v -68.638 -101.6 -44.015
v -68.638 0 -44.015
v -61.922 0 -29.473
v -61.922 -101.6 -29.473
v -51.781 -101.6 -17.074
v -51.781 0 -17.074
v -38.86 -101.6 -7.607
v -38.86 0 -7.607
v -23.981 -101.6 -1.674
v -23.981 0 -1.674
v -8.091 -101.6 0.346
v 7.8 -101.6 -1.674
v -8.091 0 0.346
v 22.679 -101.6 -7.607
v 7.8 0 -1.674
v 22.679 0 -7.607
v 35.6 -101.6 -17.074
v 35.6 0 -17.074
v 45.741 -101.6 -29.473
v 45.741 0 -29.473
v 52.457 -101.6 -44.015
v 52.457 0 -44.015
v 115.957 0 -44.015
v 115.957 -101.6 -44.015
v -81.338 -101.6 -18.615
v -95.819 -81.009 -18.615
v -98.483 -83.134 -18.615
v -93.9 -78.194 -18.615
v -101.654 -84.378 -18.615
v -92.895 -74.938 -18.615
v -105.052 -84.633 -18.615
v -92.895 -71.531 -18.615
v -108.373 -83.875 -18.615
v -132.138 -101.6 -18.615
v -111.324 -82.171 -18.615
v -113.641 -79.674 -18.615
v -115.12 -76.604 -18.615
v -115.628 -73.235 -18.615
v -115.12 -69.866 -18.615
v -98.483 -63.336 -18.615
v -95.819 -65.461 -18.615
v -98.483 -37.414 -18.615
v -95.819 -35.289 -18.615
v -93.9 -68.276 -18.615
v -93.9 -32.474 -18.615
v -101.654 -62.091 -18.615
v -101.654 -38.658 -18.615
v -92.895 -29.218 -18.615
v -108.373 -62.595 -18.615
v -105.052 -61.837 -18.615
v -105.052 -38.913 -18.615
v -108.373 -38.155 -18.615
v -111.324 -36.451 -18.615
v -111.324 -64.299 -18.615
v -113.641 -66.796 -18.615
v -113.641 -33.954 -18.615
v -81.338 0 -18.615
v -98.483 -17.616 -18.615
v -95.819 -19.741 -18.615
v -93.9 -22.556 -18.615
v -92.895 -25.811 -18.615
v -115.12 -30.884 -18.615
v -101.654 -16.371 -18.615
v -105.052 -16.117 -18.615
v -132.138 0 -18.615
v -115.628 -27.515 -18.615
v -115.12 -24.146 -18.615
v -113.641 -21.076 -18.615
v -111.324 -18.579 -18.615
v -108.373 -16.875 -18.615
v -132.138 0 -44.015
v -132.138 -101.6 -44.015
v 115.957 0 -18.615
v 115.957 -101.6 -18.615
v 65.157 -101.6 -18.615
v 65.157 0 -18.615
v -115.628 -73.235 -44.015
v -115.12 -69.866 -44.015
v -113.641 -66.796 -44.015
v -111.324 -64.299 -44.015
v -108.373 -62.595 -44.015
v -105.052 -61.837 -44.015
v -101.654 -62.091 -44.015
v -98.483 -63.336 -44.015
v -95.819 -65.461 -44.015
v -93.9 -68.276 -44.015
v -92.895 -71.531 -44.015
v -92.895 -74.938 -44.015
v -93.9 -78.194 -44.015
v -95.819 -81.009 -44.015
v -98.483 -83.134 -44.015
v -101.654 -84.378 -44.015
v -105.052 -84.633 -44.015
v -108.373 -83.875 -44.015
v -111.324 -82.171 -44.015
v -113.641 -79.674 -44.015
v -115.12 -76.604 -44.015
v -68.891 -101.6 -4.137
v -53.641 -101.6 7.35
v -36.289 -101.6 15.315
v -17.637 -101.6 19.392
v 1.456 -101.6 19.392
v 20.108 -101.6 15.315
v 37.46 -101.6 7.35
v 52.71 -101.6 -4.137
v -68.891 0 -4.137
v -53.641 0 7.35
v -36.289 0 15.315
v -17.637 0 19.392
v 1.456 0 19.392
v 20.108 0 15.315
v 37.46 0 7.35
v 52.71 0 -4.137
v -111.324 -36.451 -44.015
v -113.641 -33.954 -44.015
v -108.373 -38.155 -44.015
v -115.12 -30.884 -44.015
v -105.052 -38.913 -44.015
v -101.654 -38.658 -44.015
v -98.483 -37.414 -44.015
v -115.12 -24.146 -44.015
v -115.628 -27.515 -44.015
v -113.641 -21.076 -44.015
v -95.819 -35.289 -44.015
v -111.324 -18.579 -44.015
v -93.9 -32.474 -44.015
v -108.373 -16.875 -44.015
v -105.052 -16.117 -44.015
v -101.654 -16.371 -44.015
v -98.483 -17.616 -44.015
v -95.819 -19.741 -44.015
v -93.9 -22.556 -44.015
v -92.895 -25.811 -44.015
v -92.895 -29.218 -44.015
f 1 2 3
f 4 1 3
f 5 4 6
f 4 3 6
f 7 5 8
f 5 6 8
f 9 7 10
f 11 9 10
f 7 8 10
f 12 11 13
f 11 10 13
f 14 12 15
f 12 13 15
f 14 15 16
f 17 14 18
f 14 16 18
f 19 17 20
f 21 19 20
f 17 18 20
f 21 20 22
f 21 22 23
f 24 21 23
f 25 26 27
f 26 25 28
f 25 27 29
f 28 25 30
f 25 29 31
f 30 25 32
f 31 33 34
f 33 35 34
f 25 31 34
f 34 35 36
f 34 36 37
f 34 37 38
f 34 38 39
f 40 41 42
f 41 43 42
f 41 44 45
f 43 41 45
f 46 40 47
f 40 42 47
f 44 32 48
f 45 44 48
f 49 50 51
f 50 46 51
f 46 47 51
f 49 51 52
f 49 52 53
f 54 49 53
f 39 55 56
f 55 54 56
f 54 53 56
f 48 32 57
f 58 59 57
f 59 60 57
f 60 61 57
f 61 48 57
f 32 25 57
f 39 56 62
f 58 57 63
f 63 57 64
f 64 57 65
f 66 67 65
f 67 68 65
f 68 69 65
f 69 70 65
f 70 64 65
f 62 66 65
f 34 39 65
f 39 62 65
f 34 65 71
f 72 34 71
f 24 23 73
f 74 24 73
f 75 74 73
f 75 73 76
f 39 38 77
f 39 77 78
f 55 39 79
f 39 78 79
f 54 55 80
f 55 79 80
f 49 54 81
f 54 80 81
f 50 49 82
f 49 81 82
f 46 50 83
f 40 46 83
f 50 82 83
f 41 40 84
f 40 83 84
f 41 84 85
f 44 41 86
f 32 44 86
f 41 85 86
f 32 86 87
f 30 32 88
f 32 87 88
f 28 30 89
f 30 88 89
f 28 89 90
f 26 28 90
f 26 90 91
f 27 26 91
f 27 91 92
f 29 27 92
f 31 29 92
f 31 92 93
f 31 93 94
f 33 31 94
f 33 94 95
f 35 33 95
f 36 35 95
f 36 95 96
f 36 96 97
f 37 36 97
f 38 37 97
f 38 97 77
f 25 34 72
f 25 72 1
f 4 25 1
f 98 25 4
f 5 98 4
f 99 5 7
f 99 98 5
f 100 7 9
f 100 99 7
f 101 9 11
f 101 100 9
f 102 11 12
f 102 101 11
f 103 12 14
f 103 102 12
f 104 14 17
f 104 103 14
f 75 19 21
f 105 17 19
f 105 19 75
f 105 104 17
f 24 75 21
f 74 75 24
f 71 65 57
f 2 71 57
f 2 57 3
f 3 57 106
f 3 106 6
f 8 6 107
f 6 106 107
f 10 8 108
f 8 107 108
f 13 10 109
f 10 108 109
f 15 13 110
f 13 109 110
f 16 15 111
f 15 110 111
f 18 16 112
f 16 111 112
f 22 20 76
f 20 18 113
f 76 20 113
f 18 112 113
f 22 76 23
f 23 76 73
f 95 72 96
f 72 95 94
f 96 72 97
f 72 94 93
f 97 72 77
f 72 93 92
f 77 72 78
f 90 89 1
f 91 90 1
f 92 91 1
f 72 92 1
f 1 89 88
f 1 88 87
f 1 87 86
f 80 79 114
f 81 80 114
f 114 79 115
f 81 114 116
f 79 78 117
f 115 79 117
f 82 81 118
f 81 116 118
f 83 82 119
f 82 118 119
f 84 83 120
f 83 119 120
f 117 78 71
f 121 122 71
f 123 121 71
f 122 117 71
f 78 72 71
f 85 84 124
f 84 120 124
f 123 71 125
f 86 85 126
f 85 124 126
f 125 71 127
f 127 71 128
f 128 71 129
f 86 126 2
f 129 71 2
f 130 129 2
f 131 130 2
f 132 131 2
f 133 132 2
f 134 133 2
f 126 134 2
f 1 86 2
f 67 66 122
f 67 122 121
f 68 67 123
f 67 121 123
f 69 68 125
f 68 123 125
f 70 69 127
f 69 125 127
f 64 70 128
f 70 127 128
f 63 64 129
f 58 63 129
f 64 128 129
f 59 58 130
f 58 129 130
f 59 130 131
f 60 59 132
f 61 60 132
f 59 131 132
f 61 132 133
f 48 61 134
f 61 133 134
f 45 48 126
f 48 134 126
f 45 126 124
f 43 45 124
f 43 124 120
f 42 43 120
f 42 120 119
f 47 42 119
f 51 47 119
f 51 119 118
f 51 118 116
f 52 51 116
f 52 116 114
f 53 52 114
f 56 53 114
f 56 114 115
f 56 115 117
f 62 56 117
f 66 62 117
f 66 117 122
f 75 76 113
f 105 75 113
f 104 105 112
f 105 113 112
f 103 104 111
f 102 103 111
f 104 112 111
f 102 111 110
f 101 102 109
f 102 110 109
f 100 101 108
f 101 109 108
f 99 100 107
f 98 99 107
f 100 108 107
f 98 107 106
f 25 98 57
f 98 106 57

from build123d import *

# Parameters (mm, degrees)
F1_DEPTH = 101.6
F3_D     = 22.86


# Not quite as in the source:
# - a feature names something its author has since deleted; it is built from what else it names
# - the program builds the solid bodies; features that only make, move or delete a surface that nothing else refers to are left out


with BuildPart() as f1:
    # F0 (on Front) → F1 (new body)
    with BuildSketch(Plane.XZ):
        with BuildLine():
            Line((-132.1375894797, -18.6150499344), (-132.1375894797, -44.0150499344))
            Line((-132.1375894797, -44.0150499344), (-68.6375894797, -44.0150499344))
            ThreePointArc((-68.6375894797, -44.0150499344), (-8.0905175805, 0.345930121), (52.4565543186, -44.0150499344))
            Line((52.4565543186, -44.0150499344), (115.9565543186, -44.0150499344))
            Line((115.9565543186, -44.0150499344), (115.9565543186, -18.6150499344))
            Line((115.9565543186, -18.6150499344), (65.1565543186, -18.6150499344))
            ThreePointArc((65.1565543186, -18.6150499344), (-8.0905175805, 19.9056243635), (-81.3375894797, -18.6150499344))
            Line((-81.3375894797, -18.6150499344), (-132.1375894797, -18.6150499344))
        make_face()
    extrude(amount=F1_DEPTH)

    # F3 (through all)
    with Locations(Plane.XY.offset(-18.6150499344)):
        with Locations((-104.1975894797, -27.5148972869), (-104.1975894797, -73.2348972869)):
            Hole(F3_D / 2)


solid = f1.part
